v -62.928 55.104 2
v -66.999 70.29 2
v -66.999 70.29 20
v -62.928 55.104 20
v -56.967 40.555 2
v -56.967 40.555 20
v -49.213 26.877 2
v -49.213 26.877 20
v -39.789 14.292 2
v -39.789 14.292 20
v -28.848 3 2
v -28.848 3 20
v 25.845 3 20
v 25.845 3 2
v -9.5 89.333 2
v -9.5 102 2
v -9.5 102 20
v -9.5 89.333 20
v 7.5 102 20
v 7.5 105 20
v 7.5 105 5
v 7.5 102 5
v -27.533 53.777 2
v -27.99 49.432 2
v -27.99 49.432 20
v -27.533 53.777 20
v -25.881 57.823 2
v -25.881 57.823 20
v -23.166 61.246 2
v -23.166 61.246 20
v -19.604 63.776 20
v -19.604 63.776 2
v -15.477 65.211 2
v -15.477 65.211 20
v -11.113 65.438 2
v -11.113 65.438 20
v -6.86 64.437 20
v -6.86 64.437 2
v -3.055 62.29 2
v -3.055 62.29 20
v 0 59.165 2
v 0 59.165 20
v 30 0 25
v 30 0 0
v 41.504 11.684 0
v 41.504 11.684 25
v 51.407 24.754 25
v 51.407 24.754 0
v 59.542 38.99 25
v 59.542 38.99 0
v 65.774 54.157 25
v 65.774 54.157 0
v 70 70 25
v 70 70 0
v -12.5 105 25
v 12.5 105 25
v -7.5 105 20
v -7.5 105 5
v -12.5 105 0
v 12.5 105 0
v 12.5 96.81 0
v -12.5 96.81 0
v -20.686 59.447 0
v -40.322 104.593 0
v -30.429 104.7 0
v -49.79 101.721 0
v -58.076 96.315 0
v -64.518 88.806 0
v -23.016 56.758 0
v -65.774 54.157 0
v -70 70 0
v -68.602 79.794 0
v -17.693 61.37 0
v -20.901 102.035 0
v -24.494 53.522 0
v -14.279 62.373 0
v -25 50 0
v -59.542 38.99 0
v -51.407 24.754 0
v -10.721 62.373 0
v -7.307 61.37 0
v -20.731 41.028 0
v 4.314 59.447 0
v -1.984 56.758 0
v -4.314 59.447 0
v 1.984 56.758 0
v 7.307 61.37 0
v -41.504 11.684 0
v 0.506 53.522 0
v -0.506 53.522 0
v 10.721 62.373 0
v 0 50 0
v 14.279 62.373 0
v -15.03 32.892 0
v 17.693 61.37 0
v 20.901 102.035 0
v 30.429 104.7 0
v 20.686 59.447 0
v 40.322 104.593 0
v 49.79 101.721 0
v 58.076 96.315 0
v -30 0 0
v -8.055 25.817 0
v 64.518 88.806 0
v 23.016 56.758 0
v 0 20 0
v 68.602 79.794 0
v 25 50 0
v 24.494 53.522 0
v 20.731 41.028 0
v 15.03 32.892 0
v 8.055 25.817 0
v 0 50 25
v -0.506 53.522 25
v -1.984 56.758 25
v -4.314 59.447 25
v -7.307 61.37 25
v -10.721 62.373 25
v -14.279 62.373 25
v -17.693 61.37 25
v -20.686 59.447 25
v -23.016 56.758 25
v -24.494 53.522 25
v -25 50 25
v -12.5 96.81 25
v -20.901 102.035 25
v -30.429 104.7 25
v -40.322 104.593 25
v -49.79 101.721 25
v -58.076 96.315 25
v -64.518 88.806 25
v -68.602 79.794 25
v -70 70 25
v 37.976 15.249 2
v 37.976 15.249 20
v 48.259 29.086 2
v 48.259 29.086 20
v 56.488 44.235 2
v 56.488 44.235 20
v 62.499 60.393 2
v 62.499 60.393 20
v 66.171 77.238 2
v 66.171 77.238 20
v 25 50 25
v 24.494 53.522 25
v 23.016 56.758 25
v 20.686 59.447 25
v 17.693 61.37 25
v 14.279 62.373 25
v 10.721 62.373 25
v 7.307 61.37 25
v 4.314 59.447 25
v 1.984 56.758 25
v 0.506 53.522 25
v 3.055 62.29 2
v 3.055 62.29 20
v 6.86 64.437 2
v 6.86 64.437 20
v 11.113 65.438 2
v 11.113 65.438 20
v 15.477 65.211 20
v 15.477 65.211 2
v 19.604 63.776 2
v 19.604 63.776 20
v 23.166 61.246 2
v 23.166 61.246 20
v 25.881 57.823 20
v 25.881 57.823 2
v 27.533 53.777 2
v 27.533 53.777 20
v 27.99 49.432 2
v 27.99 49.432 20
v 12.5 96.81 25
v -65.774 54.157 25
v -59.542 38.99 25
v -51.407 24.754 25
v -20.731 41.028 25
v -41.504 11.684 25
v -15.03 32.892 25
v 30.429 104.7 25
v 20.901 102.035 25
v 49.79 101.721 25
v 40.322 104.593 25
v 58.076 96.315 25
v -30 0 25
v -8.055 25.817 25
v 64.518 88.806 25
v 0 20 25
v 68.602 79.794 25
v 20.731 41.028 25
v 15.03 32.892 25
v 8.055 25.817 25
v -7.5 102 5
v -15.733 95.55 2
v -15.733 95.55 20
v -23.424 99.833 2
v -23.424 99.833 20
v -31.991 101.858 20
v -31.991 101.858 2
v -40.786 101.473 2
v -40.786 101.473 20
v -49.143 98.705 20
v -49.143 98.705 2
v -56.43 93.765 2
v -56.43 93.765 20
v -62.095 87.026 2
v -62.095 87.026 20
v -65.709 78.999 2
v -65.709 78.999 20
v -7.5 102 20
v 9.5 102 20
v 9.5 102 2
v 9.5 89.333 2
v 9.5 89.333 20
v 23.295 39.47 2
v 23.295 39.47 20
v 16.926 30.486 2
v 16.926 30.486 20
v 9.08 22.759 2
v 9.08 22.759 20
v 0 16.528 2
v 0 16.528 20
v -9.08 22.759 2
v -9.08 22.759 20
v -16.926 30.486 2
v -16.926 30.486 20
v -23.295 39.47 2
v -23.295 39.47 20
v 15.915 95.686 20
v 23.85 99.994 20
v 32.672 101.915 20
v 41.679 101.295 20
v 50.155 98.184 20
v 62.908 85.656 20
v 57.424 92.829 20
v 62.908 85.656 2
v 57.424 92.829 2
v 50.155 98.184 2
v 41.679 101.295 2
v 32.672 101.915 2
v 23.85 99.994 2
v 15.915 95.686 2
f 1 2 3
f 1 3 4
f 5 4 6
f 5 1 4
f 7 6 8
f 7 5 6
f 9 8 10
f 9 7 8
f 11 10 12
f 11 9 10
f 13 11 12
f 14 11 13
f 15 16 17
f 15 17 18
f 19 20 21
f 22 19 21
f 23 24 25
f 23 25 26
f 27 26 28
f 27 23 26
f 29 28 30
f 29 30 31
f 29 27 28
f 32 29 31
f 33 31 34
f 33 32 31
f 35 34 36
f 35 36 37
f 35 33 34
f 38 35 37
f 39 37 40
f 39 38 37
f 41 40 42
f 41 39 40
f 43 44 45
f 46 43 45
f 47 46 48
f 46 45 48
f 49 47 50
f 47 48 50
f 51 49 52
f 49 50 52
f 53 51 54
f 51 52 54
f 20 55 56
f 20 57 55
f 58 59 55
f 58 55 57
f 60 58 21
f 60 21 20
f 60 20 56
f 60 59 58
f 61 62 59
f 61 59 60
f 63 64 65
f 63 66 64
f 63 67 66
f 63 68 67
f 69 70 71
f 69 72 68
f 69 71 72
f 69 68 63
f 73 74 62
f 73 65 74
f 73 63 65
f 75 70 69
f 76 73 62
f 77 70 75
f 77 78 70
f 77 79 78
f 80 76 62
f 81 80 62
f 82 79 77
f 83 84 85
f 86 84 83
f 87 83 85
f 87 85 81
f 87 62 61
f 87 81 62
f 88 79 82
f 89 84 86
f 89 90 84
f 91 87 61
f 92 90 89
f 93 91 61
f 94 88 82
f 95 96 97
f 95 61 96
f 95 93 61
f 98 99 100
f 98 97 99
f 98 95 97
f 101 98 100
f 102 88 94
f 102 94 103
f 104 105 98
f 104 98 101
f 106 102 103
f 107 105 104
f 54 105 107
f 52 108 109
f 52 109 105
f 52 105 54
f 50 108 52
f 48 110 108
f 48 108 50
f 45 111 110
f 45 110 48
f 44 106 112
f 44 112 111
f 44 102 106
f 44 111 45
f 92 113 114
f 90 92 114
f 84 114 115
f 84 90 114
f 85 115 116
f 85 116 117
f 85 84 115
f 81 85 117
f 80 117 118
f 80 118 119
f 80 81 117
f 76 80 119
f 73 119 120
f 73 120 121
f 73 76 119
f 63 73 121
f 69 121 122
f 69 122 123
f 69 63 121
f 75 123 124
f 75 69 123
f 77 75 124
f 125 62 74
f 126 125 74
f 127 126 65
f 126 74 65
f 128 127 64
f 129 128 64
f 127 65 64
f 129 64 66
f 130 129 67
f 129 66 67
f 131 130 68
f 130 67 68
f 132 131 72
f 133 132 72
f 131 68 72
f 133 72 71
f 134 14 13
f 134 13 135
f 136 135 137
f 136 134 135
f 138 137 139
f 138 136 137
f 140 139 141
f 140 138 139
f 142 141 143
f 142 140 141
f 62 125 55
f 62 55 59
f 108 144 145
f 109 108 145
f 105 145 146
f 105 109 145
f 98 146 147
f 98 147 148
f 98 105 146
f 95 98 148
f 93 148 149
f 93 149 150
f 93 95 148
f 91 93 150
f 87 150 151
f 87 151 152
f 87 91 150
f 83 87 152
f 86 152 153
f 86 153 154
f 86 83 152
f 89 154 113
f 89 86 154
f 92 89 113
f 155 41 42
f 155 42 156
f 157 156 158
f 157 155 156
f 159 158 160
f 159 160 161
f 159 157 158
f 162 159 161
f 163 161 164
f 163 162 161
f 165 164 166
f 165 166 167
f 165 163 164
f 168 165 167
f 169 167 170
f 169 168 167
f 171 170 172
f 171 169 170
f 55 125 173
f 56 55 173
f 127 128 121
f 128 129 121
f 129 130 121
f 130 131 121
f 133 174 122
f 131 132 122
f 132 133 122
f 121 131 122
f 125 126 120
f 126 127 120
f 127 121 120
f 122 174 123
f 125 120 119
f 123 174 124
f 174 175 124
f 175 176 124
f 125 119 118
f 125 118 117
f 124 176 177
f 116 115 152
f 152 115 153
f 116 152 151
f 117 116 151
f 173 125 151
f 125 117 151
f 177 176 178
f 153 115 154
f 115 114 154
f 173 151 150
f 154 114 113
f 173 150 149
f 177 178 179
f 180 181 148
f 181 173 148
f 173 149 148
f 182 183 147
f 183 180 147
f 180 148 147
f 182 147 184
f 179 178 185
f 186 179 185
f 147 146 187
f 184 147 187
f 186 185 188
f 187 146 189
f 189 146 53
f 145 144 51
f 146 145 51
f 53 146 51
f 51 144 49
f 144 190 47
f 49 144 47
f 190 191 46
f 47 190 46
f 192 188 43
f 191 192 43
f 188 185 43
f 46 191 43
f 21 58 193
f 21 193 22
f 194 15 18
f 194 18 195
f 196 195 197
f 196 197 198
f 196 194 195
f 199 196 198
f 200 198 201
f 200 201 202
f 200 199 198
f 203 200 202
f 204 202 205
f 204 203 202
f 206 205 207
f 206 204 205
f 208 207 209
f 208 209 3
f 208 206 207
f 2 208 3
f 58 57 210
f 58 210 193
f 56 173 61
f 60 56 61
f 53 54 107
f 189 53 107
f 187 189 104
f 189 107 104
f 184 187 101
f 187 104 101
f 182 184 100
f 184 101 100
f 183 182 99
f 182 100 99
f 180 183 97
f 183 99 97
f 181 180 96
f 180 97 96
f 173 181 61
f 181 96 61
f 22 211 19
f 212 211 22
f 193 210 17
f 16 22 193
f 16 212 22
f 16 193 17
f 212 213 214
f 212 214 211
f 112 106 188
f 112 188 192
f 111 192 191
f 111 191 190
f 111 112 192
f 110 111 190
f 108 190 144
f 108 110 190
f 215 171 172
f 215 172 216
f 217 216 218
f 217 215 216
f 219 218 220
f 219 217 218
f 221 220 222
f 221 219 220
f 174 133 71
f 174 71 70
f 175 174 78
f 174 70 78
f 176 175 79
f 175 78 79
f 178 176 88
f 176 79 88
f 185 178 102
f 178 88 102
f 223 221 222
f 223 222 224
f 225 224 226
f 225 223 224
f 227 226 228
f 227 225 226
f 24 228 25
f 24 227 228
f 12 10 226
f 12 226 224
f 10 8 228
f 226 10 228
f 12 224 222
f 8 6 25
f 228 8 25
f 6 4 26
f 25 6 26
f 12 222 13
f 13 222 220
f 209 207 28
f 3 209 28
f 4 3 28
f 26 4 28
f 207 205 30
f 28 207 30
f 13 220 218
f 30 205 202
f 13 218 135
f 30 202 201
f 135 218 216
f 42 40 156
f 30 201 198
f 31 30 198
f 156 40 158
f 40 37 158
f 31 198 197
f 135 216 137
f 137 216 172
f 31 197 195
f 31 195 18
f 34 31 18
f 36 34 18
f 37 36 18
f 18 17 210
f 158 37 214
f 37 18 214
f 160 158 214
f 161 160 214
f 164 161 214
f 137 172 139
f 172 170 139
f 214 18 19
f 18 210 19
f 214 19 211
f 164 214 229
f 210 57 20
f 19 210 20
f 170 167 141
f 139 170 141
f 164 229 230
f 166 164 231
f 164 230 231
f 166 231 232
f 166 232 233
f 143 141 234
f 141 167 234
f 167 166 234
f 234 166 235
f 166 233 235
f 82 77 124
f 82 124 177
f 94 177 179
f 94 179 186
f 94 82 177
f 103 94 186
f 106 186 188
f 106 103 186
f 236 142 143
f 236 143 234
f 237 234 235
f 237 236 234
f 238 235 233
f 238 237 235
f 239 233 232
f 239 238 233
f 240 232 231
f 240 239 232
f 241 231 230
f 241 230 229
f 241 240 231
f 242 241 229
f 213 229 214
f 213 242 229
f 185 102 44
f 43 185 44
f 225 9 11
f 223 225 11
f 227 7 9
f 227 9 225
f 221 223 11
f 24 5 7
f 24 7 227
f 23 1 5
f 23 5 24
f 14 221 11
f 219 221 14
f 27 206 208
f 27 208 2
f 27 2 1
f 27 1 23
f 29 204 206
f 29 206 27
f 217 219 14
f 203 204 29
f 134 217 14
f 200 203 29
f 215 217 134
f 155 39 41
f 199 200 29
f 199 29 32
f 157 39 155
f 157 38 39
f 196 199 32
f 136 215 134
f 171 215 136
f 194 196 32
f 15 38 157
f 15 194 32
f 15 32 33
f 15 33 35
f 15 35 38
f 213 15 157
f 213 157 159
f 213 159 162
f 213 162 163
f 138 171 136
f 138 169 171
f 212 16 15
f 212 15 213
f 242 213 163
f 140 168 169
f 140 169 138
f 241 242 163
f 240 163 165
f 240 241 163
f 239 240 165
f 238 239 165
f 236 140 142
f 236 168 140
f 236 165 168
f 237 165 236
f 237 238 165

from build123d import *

# Parameters (mm, degrees)
SALIENTE_EXTRUIR1_DEPTH = 25
CORTAR_EXTRUIR1_DEPTH   = 25
CROQUIS5_W              = 25
CROQUIS5_H              = 25
SALIENTE_EXTRUIR2_DEPTH = 35
VACIADO14_START         = 2
VACIADO14_DEPTH         = 18
CROQUIS14_W             = 15
CROQUIS14_H             = 15
CORTAR_EXTRUIR3_DEPTH   = 37


# Read off the part's stored shape, not the designer's step: Vaciado14
with BuildPart() as part:
    # Croquis1 → Saliente-Extruir1 (new body)
    with BuildSketch(Plane.XY):
        with BuildLine():
            Line((0, 0), (30, 0))
            ThreePointArc((30, 0), (55.704345855, 31.740373797), (70, 70))
            ThreePointArc((70, 70), (49.790199458, 101.721443851), (12.5, 96.809513237))
            Line((12.5, 96.809513237), (12.5, 70))
            Line((12.5, 70), (0, 70))
            Line((0, 70), (-12.5, 70))
            Line((-12.5, 70), (-12.5, 96.809513237))
            ThreePointArc((-12.5, 96.809513237), (-49.790199458, 101.721443851), (-70, 70))
            ThreePointArc((-70, 70), (-55.704345855, 31.740373797), (-30, 0))
            Line((-30, 0), (0, 0))
        make_face()
    extrude(amount=SALIENTE_EXTRUIR1_DEPTH)

    # Croquis2 → Cortar-Extruir1 (cut)
    with BuildSketch(Plane.XY):
        with BuildLine():
            ThreePointArc((25, 50), (12.5, 62.5), (0, 50))
            ThreePointArc((0, 50), (-12.5, 62.5), (-25, 50))
            ThreePointArc((-25, 50), (-15.02993221, 32.891723159), (0, 20))
            ThreePointArc((0, 20), (15.02993221, 32.891723159), (25, 50))
        make_face()
    extrude(amount=CORTAR_EXTRUIR1_DEPTH, mode=Mode.SUBTRACT)

    # Croquis5 → Saliente-Extruir2 (add)
    with BuildSketch(Plane(origin=(0, 70, 0), x_dir=(1, 0, 0), z_dir=(0, 1, 0))):
        with Locations((0, -12.5)):
            Rectangle(CROQUIS5_W, CROQUIS5_H)
    extrude(amount=SALIENTE_EXTRUIR2_DEPTH)

    # Vaciado14 outline → Vaciado14 (cut)
    with BuildSketch(Plane.XY.offset(VACIADO14_START)):
        with BuildLine():
            Line((-28.84831613, 3), (25.844637923, 3))
            ThreePointArc((25.844637923, 3), (52.641551282, 36.515307349), (66.170757203, 77.237671959))
            ThreePointArc((66.170757203, 77.237671959), (41.679167851, 101.2951868), (9.5, 89.332614929))
            Line((9.5, 89.332614929), (9.5, 102))
            Line((9.5, 102), (-9.5, 102))
            Line((-9.5, 102), (-9.5, 89.332614929))
            ThreePointArc((-9.5, 89.332614929), (-45.060390177, 100.377434873), (-66.998683941, 70.290217258))
            ThreePointArc((-66.998683941, 70.290217258), (-53.306904817, 33.592972957), (-28.84831613, 3))
        make_face()
        with BuildLine():
            ThreePointArc((0, 59.16515139), (17.591066798, 64.640049141), (27.989581723, 49.43179402))
            ThreePointArc((27.989581723, 49.43179402), (16.926348915, 30.486291666), (0, 16.528287079))
            ThreePointArc((0, 16.528287079), (-16.926348915, 30.486291666), (-27.989581723, 49.43179402))
            ThreePointArc((-27.989581723, 49.43179402), (-17.591066798, 64.640049141), (0, 59.16515139))
        make_face(mode=Mode.SUBTRACT)
    extrude(amount=VACIADO14_DEPTH, mode=Mode.SUBTRACT)

    # Croquis14 → Cortar-Extruir3 (cut)
    with BuildSketch(Plane(origin=(0, 120, 0), x_dir=(1, 0, 0), z_dir=(0, 1, 0))):
        with Locations((0, -12.5)):
            Rectangle(CROQUIS14_W, CROQUIS14_H)
    extrude(amount=-CORTAR_EXTRUIR3_DEPTH, mode=Mode.SUBTRACT)


solid = part.part
